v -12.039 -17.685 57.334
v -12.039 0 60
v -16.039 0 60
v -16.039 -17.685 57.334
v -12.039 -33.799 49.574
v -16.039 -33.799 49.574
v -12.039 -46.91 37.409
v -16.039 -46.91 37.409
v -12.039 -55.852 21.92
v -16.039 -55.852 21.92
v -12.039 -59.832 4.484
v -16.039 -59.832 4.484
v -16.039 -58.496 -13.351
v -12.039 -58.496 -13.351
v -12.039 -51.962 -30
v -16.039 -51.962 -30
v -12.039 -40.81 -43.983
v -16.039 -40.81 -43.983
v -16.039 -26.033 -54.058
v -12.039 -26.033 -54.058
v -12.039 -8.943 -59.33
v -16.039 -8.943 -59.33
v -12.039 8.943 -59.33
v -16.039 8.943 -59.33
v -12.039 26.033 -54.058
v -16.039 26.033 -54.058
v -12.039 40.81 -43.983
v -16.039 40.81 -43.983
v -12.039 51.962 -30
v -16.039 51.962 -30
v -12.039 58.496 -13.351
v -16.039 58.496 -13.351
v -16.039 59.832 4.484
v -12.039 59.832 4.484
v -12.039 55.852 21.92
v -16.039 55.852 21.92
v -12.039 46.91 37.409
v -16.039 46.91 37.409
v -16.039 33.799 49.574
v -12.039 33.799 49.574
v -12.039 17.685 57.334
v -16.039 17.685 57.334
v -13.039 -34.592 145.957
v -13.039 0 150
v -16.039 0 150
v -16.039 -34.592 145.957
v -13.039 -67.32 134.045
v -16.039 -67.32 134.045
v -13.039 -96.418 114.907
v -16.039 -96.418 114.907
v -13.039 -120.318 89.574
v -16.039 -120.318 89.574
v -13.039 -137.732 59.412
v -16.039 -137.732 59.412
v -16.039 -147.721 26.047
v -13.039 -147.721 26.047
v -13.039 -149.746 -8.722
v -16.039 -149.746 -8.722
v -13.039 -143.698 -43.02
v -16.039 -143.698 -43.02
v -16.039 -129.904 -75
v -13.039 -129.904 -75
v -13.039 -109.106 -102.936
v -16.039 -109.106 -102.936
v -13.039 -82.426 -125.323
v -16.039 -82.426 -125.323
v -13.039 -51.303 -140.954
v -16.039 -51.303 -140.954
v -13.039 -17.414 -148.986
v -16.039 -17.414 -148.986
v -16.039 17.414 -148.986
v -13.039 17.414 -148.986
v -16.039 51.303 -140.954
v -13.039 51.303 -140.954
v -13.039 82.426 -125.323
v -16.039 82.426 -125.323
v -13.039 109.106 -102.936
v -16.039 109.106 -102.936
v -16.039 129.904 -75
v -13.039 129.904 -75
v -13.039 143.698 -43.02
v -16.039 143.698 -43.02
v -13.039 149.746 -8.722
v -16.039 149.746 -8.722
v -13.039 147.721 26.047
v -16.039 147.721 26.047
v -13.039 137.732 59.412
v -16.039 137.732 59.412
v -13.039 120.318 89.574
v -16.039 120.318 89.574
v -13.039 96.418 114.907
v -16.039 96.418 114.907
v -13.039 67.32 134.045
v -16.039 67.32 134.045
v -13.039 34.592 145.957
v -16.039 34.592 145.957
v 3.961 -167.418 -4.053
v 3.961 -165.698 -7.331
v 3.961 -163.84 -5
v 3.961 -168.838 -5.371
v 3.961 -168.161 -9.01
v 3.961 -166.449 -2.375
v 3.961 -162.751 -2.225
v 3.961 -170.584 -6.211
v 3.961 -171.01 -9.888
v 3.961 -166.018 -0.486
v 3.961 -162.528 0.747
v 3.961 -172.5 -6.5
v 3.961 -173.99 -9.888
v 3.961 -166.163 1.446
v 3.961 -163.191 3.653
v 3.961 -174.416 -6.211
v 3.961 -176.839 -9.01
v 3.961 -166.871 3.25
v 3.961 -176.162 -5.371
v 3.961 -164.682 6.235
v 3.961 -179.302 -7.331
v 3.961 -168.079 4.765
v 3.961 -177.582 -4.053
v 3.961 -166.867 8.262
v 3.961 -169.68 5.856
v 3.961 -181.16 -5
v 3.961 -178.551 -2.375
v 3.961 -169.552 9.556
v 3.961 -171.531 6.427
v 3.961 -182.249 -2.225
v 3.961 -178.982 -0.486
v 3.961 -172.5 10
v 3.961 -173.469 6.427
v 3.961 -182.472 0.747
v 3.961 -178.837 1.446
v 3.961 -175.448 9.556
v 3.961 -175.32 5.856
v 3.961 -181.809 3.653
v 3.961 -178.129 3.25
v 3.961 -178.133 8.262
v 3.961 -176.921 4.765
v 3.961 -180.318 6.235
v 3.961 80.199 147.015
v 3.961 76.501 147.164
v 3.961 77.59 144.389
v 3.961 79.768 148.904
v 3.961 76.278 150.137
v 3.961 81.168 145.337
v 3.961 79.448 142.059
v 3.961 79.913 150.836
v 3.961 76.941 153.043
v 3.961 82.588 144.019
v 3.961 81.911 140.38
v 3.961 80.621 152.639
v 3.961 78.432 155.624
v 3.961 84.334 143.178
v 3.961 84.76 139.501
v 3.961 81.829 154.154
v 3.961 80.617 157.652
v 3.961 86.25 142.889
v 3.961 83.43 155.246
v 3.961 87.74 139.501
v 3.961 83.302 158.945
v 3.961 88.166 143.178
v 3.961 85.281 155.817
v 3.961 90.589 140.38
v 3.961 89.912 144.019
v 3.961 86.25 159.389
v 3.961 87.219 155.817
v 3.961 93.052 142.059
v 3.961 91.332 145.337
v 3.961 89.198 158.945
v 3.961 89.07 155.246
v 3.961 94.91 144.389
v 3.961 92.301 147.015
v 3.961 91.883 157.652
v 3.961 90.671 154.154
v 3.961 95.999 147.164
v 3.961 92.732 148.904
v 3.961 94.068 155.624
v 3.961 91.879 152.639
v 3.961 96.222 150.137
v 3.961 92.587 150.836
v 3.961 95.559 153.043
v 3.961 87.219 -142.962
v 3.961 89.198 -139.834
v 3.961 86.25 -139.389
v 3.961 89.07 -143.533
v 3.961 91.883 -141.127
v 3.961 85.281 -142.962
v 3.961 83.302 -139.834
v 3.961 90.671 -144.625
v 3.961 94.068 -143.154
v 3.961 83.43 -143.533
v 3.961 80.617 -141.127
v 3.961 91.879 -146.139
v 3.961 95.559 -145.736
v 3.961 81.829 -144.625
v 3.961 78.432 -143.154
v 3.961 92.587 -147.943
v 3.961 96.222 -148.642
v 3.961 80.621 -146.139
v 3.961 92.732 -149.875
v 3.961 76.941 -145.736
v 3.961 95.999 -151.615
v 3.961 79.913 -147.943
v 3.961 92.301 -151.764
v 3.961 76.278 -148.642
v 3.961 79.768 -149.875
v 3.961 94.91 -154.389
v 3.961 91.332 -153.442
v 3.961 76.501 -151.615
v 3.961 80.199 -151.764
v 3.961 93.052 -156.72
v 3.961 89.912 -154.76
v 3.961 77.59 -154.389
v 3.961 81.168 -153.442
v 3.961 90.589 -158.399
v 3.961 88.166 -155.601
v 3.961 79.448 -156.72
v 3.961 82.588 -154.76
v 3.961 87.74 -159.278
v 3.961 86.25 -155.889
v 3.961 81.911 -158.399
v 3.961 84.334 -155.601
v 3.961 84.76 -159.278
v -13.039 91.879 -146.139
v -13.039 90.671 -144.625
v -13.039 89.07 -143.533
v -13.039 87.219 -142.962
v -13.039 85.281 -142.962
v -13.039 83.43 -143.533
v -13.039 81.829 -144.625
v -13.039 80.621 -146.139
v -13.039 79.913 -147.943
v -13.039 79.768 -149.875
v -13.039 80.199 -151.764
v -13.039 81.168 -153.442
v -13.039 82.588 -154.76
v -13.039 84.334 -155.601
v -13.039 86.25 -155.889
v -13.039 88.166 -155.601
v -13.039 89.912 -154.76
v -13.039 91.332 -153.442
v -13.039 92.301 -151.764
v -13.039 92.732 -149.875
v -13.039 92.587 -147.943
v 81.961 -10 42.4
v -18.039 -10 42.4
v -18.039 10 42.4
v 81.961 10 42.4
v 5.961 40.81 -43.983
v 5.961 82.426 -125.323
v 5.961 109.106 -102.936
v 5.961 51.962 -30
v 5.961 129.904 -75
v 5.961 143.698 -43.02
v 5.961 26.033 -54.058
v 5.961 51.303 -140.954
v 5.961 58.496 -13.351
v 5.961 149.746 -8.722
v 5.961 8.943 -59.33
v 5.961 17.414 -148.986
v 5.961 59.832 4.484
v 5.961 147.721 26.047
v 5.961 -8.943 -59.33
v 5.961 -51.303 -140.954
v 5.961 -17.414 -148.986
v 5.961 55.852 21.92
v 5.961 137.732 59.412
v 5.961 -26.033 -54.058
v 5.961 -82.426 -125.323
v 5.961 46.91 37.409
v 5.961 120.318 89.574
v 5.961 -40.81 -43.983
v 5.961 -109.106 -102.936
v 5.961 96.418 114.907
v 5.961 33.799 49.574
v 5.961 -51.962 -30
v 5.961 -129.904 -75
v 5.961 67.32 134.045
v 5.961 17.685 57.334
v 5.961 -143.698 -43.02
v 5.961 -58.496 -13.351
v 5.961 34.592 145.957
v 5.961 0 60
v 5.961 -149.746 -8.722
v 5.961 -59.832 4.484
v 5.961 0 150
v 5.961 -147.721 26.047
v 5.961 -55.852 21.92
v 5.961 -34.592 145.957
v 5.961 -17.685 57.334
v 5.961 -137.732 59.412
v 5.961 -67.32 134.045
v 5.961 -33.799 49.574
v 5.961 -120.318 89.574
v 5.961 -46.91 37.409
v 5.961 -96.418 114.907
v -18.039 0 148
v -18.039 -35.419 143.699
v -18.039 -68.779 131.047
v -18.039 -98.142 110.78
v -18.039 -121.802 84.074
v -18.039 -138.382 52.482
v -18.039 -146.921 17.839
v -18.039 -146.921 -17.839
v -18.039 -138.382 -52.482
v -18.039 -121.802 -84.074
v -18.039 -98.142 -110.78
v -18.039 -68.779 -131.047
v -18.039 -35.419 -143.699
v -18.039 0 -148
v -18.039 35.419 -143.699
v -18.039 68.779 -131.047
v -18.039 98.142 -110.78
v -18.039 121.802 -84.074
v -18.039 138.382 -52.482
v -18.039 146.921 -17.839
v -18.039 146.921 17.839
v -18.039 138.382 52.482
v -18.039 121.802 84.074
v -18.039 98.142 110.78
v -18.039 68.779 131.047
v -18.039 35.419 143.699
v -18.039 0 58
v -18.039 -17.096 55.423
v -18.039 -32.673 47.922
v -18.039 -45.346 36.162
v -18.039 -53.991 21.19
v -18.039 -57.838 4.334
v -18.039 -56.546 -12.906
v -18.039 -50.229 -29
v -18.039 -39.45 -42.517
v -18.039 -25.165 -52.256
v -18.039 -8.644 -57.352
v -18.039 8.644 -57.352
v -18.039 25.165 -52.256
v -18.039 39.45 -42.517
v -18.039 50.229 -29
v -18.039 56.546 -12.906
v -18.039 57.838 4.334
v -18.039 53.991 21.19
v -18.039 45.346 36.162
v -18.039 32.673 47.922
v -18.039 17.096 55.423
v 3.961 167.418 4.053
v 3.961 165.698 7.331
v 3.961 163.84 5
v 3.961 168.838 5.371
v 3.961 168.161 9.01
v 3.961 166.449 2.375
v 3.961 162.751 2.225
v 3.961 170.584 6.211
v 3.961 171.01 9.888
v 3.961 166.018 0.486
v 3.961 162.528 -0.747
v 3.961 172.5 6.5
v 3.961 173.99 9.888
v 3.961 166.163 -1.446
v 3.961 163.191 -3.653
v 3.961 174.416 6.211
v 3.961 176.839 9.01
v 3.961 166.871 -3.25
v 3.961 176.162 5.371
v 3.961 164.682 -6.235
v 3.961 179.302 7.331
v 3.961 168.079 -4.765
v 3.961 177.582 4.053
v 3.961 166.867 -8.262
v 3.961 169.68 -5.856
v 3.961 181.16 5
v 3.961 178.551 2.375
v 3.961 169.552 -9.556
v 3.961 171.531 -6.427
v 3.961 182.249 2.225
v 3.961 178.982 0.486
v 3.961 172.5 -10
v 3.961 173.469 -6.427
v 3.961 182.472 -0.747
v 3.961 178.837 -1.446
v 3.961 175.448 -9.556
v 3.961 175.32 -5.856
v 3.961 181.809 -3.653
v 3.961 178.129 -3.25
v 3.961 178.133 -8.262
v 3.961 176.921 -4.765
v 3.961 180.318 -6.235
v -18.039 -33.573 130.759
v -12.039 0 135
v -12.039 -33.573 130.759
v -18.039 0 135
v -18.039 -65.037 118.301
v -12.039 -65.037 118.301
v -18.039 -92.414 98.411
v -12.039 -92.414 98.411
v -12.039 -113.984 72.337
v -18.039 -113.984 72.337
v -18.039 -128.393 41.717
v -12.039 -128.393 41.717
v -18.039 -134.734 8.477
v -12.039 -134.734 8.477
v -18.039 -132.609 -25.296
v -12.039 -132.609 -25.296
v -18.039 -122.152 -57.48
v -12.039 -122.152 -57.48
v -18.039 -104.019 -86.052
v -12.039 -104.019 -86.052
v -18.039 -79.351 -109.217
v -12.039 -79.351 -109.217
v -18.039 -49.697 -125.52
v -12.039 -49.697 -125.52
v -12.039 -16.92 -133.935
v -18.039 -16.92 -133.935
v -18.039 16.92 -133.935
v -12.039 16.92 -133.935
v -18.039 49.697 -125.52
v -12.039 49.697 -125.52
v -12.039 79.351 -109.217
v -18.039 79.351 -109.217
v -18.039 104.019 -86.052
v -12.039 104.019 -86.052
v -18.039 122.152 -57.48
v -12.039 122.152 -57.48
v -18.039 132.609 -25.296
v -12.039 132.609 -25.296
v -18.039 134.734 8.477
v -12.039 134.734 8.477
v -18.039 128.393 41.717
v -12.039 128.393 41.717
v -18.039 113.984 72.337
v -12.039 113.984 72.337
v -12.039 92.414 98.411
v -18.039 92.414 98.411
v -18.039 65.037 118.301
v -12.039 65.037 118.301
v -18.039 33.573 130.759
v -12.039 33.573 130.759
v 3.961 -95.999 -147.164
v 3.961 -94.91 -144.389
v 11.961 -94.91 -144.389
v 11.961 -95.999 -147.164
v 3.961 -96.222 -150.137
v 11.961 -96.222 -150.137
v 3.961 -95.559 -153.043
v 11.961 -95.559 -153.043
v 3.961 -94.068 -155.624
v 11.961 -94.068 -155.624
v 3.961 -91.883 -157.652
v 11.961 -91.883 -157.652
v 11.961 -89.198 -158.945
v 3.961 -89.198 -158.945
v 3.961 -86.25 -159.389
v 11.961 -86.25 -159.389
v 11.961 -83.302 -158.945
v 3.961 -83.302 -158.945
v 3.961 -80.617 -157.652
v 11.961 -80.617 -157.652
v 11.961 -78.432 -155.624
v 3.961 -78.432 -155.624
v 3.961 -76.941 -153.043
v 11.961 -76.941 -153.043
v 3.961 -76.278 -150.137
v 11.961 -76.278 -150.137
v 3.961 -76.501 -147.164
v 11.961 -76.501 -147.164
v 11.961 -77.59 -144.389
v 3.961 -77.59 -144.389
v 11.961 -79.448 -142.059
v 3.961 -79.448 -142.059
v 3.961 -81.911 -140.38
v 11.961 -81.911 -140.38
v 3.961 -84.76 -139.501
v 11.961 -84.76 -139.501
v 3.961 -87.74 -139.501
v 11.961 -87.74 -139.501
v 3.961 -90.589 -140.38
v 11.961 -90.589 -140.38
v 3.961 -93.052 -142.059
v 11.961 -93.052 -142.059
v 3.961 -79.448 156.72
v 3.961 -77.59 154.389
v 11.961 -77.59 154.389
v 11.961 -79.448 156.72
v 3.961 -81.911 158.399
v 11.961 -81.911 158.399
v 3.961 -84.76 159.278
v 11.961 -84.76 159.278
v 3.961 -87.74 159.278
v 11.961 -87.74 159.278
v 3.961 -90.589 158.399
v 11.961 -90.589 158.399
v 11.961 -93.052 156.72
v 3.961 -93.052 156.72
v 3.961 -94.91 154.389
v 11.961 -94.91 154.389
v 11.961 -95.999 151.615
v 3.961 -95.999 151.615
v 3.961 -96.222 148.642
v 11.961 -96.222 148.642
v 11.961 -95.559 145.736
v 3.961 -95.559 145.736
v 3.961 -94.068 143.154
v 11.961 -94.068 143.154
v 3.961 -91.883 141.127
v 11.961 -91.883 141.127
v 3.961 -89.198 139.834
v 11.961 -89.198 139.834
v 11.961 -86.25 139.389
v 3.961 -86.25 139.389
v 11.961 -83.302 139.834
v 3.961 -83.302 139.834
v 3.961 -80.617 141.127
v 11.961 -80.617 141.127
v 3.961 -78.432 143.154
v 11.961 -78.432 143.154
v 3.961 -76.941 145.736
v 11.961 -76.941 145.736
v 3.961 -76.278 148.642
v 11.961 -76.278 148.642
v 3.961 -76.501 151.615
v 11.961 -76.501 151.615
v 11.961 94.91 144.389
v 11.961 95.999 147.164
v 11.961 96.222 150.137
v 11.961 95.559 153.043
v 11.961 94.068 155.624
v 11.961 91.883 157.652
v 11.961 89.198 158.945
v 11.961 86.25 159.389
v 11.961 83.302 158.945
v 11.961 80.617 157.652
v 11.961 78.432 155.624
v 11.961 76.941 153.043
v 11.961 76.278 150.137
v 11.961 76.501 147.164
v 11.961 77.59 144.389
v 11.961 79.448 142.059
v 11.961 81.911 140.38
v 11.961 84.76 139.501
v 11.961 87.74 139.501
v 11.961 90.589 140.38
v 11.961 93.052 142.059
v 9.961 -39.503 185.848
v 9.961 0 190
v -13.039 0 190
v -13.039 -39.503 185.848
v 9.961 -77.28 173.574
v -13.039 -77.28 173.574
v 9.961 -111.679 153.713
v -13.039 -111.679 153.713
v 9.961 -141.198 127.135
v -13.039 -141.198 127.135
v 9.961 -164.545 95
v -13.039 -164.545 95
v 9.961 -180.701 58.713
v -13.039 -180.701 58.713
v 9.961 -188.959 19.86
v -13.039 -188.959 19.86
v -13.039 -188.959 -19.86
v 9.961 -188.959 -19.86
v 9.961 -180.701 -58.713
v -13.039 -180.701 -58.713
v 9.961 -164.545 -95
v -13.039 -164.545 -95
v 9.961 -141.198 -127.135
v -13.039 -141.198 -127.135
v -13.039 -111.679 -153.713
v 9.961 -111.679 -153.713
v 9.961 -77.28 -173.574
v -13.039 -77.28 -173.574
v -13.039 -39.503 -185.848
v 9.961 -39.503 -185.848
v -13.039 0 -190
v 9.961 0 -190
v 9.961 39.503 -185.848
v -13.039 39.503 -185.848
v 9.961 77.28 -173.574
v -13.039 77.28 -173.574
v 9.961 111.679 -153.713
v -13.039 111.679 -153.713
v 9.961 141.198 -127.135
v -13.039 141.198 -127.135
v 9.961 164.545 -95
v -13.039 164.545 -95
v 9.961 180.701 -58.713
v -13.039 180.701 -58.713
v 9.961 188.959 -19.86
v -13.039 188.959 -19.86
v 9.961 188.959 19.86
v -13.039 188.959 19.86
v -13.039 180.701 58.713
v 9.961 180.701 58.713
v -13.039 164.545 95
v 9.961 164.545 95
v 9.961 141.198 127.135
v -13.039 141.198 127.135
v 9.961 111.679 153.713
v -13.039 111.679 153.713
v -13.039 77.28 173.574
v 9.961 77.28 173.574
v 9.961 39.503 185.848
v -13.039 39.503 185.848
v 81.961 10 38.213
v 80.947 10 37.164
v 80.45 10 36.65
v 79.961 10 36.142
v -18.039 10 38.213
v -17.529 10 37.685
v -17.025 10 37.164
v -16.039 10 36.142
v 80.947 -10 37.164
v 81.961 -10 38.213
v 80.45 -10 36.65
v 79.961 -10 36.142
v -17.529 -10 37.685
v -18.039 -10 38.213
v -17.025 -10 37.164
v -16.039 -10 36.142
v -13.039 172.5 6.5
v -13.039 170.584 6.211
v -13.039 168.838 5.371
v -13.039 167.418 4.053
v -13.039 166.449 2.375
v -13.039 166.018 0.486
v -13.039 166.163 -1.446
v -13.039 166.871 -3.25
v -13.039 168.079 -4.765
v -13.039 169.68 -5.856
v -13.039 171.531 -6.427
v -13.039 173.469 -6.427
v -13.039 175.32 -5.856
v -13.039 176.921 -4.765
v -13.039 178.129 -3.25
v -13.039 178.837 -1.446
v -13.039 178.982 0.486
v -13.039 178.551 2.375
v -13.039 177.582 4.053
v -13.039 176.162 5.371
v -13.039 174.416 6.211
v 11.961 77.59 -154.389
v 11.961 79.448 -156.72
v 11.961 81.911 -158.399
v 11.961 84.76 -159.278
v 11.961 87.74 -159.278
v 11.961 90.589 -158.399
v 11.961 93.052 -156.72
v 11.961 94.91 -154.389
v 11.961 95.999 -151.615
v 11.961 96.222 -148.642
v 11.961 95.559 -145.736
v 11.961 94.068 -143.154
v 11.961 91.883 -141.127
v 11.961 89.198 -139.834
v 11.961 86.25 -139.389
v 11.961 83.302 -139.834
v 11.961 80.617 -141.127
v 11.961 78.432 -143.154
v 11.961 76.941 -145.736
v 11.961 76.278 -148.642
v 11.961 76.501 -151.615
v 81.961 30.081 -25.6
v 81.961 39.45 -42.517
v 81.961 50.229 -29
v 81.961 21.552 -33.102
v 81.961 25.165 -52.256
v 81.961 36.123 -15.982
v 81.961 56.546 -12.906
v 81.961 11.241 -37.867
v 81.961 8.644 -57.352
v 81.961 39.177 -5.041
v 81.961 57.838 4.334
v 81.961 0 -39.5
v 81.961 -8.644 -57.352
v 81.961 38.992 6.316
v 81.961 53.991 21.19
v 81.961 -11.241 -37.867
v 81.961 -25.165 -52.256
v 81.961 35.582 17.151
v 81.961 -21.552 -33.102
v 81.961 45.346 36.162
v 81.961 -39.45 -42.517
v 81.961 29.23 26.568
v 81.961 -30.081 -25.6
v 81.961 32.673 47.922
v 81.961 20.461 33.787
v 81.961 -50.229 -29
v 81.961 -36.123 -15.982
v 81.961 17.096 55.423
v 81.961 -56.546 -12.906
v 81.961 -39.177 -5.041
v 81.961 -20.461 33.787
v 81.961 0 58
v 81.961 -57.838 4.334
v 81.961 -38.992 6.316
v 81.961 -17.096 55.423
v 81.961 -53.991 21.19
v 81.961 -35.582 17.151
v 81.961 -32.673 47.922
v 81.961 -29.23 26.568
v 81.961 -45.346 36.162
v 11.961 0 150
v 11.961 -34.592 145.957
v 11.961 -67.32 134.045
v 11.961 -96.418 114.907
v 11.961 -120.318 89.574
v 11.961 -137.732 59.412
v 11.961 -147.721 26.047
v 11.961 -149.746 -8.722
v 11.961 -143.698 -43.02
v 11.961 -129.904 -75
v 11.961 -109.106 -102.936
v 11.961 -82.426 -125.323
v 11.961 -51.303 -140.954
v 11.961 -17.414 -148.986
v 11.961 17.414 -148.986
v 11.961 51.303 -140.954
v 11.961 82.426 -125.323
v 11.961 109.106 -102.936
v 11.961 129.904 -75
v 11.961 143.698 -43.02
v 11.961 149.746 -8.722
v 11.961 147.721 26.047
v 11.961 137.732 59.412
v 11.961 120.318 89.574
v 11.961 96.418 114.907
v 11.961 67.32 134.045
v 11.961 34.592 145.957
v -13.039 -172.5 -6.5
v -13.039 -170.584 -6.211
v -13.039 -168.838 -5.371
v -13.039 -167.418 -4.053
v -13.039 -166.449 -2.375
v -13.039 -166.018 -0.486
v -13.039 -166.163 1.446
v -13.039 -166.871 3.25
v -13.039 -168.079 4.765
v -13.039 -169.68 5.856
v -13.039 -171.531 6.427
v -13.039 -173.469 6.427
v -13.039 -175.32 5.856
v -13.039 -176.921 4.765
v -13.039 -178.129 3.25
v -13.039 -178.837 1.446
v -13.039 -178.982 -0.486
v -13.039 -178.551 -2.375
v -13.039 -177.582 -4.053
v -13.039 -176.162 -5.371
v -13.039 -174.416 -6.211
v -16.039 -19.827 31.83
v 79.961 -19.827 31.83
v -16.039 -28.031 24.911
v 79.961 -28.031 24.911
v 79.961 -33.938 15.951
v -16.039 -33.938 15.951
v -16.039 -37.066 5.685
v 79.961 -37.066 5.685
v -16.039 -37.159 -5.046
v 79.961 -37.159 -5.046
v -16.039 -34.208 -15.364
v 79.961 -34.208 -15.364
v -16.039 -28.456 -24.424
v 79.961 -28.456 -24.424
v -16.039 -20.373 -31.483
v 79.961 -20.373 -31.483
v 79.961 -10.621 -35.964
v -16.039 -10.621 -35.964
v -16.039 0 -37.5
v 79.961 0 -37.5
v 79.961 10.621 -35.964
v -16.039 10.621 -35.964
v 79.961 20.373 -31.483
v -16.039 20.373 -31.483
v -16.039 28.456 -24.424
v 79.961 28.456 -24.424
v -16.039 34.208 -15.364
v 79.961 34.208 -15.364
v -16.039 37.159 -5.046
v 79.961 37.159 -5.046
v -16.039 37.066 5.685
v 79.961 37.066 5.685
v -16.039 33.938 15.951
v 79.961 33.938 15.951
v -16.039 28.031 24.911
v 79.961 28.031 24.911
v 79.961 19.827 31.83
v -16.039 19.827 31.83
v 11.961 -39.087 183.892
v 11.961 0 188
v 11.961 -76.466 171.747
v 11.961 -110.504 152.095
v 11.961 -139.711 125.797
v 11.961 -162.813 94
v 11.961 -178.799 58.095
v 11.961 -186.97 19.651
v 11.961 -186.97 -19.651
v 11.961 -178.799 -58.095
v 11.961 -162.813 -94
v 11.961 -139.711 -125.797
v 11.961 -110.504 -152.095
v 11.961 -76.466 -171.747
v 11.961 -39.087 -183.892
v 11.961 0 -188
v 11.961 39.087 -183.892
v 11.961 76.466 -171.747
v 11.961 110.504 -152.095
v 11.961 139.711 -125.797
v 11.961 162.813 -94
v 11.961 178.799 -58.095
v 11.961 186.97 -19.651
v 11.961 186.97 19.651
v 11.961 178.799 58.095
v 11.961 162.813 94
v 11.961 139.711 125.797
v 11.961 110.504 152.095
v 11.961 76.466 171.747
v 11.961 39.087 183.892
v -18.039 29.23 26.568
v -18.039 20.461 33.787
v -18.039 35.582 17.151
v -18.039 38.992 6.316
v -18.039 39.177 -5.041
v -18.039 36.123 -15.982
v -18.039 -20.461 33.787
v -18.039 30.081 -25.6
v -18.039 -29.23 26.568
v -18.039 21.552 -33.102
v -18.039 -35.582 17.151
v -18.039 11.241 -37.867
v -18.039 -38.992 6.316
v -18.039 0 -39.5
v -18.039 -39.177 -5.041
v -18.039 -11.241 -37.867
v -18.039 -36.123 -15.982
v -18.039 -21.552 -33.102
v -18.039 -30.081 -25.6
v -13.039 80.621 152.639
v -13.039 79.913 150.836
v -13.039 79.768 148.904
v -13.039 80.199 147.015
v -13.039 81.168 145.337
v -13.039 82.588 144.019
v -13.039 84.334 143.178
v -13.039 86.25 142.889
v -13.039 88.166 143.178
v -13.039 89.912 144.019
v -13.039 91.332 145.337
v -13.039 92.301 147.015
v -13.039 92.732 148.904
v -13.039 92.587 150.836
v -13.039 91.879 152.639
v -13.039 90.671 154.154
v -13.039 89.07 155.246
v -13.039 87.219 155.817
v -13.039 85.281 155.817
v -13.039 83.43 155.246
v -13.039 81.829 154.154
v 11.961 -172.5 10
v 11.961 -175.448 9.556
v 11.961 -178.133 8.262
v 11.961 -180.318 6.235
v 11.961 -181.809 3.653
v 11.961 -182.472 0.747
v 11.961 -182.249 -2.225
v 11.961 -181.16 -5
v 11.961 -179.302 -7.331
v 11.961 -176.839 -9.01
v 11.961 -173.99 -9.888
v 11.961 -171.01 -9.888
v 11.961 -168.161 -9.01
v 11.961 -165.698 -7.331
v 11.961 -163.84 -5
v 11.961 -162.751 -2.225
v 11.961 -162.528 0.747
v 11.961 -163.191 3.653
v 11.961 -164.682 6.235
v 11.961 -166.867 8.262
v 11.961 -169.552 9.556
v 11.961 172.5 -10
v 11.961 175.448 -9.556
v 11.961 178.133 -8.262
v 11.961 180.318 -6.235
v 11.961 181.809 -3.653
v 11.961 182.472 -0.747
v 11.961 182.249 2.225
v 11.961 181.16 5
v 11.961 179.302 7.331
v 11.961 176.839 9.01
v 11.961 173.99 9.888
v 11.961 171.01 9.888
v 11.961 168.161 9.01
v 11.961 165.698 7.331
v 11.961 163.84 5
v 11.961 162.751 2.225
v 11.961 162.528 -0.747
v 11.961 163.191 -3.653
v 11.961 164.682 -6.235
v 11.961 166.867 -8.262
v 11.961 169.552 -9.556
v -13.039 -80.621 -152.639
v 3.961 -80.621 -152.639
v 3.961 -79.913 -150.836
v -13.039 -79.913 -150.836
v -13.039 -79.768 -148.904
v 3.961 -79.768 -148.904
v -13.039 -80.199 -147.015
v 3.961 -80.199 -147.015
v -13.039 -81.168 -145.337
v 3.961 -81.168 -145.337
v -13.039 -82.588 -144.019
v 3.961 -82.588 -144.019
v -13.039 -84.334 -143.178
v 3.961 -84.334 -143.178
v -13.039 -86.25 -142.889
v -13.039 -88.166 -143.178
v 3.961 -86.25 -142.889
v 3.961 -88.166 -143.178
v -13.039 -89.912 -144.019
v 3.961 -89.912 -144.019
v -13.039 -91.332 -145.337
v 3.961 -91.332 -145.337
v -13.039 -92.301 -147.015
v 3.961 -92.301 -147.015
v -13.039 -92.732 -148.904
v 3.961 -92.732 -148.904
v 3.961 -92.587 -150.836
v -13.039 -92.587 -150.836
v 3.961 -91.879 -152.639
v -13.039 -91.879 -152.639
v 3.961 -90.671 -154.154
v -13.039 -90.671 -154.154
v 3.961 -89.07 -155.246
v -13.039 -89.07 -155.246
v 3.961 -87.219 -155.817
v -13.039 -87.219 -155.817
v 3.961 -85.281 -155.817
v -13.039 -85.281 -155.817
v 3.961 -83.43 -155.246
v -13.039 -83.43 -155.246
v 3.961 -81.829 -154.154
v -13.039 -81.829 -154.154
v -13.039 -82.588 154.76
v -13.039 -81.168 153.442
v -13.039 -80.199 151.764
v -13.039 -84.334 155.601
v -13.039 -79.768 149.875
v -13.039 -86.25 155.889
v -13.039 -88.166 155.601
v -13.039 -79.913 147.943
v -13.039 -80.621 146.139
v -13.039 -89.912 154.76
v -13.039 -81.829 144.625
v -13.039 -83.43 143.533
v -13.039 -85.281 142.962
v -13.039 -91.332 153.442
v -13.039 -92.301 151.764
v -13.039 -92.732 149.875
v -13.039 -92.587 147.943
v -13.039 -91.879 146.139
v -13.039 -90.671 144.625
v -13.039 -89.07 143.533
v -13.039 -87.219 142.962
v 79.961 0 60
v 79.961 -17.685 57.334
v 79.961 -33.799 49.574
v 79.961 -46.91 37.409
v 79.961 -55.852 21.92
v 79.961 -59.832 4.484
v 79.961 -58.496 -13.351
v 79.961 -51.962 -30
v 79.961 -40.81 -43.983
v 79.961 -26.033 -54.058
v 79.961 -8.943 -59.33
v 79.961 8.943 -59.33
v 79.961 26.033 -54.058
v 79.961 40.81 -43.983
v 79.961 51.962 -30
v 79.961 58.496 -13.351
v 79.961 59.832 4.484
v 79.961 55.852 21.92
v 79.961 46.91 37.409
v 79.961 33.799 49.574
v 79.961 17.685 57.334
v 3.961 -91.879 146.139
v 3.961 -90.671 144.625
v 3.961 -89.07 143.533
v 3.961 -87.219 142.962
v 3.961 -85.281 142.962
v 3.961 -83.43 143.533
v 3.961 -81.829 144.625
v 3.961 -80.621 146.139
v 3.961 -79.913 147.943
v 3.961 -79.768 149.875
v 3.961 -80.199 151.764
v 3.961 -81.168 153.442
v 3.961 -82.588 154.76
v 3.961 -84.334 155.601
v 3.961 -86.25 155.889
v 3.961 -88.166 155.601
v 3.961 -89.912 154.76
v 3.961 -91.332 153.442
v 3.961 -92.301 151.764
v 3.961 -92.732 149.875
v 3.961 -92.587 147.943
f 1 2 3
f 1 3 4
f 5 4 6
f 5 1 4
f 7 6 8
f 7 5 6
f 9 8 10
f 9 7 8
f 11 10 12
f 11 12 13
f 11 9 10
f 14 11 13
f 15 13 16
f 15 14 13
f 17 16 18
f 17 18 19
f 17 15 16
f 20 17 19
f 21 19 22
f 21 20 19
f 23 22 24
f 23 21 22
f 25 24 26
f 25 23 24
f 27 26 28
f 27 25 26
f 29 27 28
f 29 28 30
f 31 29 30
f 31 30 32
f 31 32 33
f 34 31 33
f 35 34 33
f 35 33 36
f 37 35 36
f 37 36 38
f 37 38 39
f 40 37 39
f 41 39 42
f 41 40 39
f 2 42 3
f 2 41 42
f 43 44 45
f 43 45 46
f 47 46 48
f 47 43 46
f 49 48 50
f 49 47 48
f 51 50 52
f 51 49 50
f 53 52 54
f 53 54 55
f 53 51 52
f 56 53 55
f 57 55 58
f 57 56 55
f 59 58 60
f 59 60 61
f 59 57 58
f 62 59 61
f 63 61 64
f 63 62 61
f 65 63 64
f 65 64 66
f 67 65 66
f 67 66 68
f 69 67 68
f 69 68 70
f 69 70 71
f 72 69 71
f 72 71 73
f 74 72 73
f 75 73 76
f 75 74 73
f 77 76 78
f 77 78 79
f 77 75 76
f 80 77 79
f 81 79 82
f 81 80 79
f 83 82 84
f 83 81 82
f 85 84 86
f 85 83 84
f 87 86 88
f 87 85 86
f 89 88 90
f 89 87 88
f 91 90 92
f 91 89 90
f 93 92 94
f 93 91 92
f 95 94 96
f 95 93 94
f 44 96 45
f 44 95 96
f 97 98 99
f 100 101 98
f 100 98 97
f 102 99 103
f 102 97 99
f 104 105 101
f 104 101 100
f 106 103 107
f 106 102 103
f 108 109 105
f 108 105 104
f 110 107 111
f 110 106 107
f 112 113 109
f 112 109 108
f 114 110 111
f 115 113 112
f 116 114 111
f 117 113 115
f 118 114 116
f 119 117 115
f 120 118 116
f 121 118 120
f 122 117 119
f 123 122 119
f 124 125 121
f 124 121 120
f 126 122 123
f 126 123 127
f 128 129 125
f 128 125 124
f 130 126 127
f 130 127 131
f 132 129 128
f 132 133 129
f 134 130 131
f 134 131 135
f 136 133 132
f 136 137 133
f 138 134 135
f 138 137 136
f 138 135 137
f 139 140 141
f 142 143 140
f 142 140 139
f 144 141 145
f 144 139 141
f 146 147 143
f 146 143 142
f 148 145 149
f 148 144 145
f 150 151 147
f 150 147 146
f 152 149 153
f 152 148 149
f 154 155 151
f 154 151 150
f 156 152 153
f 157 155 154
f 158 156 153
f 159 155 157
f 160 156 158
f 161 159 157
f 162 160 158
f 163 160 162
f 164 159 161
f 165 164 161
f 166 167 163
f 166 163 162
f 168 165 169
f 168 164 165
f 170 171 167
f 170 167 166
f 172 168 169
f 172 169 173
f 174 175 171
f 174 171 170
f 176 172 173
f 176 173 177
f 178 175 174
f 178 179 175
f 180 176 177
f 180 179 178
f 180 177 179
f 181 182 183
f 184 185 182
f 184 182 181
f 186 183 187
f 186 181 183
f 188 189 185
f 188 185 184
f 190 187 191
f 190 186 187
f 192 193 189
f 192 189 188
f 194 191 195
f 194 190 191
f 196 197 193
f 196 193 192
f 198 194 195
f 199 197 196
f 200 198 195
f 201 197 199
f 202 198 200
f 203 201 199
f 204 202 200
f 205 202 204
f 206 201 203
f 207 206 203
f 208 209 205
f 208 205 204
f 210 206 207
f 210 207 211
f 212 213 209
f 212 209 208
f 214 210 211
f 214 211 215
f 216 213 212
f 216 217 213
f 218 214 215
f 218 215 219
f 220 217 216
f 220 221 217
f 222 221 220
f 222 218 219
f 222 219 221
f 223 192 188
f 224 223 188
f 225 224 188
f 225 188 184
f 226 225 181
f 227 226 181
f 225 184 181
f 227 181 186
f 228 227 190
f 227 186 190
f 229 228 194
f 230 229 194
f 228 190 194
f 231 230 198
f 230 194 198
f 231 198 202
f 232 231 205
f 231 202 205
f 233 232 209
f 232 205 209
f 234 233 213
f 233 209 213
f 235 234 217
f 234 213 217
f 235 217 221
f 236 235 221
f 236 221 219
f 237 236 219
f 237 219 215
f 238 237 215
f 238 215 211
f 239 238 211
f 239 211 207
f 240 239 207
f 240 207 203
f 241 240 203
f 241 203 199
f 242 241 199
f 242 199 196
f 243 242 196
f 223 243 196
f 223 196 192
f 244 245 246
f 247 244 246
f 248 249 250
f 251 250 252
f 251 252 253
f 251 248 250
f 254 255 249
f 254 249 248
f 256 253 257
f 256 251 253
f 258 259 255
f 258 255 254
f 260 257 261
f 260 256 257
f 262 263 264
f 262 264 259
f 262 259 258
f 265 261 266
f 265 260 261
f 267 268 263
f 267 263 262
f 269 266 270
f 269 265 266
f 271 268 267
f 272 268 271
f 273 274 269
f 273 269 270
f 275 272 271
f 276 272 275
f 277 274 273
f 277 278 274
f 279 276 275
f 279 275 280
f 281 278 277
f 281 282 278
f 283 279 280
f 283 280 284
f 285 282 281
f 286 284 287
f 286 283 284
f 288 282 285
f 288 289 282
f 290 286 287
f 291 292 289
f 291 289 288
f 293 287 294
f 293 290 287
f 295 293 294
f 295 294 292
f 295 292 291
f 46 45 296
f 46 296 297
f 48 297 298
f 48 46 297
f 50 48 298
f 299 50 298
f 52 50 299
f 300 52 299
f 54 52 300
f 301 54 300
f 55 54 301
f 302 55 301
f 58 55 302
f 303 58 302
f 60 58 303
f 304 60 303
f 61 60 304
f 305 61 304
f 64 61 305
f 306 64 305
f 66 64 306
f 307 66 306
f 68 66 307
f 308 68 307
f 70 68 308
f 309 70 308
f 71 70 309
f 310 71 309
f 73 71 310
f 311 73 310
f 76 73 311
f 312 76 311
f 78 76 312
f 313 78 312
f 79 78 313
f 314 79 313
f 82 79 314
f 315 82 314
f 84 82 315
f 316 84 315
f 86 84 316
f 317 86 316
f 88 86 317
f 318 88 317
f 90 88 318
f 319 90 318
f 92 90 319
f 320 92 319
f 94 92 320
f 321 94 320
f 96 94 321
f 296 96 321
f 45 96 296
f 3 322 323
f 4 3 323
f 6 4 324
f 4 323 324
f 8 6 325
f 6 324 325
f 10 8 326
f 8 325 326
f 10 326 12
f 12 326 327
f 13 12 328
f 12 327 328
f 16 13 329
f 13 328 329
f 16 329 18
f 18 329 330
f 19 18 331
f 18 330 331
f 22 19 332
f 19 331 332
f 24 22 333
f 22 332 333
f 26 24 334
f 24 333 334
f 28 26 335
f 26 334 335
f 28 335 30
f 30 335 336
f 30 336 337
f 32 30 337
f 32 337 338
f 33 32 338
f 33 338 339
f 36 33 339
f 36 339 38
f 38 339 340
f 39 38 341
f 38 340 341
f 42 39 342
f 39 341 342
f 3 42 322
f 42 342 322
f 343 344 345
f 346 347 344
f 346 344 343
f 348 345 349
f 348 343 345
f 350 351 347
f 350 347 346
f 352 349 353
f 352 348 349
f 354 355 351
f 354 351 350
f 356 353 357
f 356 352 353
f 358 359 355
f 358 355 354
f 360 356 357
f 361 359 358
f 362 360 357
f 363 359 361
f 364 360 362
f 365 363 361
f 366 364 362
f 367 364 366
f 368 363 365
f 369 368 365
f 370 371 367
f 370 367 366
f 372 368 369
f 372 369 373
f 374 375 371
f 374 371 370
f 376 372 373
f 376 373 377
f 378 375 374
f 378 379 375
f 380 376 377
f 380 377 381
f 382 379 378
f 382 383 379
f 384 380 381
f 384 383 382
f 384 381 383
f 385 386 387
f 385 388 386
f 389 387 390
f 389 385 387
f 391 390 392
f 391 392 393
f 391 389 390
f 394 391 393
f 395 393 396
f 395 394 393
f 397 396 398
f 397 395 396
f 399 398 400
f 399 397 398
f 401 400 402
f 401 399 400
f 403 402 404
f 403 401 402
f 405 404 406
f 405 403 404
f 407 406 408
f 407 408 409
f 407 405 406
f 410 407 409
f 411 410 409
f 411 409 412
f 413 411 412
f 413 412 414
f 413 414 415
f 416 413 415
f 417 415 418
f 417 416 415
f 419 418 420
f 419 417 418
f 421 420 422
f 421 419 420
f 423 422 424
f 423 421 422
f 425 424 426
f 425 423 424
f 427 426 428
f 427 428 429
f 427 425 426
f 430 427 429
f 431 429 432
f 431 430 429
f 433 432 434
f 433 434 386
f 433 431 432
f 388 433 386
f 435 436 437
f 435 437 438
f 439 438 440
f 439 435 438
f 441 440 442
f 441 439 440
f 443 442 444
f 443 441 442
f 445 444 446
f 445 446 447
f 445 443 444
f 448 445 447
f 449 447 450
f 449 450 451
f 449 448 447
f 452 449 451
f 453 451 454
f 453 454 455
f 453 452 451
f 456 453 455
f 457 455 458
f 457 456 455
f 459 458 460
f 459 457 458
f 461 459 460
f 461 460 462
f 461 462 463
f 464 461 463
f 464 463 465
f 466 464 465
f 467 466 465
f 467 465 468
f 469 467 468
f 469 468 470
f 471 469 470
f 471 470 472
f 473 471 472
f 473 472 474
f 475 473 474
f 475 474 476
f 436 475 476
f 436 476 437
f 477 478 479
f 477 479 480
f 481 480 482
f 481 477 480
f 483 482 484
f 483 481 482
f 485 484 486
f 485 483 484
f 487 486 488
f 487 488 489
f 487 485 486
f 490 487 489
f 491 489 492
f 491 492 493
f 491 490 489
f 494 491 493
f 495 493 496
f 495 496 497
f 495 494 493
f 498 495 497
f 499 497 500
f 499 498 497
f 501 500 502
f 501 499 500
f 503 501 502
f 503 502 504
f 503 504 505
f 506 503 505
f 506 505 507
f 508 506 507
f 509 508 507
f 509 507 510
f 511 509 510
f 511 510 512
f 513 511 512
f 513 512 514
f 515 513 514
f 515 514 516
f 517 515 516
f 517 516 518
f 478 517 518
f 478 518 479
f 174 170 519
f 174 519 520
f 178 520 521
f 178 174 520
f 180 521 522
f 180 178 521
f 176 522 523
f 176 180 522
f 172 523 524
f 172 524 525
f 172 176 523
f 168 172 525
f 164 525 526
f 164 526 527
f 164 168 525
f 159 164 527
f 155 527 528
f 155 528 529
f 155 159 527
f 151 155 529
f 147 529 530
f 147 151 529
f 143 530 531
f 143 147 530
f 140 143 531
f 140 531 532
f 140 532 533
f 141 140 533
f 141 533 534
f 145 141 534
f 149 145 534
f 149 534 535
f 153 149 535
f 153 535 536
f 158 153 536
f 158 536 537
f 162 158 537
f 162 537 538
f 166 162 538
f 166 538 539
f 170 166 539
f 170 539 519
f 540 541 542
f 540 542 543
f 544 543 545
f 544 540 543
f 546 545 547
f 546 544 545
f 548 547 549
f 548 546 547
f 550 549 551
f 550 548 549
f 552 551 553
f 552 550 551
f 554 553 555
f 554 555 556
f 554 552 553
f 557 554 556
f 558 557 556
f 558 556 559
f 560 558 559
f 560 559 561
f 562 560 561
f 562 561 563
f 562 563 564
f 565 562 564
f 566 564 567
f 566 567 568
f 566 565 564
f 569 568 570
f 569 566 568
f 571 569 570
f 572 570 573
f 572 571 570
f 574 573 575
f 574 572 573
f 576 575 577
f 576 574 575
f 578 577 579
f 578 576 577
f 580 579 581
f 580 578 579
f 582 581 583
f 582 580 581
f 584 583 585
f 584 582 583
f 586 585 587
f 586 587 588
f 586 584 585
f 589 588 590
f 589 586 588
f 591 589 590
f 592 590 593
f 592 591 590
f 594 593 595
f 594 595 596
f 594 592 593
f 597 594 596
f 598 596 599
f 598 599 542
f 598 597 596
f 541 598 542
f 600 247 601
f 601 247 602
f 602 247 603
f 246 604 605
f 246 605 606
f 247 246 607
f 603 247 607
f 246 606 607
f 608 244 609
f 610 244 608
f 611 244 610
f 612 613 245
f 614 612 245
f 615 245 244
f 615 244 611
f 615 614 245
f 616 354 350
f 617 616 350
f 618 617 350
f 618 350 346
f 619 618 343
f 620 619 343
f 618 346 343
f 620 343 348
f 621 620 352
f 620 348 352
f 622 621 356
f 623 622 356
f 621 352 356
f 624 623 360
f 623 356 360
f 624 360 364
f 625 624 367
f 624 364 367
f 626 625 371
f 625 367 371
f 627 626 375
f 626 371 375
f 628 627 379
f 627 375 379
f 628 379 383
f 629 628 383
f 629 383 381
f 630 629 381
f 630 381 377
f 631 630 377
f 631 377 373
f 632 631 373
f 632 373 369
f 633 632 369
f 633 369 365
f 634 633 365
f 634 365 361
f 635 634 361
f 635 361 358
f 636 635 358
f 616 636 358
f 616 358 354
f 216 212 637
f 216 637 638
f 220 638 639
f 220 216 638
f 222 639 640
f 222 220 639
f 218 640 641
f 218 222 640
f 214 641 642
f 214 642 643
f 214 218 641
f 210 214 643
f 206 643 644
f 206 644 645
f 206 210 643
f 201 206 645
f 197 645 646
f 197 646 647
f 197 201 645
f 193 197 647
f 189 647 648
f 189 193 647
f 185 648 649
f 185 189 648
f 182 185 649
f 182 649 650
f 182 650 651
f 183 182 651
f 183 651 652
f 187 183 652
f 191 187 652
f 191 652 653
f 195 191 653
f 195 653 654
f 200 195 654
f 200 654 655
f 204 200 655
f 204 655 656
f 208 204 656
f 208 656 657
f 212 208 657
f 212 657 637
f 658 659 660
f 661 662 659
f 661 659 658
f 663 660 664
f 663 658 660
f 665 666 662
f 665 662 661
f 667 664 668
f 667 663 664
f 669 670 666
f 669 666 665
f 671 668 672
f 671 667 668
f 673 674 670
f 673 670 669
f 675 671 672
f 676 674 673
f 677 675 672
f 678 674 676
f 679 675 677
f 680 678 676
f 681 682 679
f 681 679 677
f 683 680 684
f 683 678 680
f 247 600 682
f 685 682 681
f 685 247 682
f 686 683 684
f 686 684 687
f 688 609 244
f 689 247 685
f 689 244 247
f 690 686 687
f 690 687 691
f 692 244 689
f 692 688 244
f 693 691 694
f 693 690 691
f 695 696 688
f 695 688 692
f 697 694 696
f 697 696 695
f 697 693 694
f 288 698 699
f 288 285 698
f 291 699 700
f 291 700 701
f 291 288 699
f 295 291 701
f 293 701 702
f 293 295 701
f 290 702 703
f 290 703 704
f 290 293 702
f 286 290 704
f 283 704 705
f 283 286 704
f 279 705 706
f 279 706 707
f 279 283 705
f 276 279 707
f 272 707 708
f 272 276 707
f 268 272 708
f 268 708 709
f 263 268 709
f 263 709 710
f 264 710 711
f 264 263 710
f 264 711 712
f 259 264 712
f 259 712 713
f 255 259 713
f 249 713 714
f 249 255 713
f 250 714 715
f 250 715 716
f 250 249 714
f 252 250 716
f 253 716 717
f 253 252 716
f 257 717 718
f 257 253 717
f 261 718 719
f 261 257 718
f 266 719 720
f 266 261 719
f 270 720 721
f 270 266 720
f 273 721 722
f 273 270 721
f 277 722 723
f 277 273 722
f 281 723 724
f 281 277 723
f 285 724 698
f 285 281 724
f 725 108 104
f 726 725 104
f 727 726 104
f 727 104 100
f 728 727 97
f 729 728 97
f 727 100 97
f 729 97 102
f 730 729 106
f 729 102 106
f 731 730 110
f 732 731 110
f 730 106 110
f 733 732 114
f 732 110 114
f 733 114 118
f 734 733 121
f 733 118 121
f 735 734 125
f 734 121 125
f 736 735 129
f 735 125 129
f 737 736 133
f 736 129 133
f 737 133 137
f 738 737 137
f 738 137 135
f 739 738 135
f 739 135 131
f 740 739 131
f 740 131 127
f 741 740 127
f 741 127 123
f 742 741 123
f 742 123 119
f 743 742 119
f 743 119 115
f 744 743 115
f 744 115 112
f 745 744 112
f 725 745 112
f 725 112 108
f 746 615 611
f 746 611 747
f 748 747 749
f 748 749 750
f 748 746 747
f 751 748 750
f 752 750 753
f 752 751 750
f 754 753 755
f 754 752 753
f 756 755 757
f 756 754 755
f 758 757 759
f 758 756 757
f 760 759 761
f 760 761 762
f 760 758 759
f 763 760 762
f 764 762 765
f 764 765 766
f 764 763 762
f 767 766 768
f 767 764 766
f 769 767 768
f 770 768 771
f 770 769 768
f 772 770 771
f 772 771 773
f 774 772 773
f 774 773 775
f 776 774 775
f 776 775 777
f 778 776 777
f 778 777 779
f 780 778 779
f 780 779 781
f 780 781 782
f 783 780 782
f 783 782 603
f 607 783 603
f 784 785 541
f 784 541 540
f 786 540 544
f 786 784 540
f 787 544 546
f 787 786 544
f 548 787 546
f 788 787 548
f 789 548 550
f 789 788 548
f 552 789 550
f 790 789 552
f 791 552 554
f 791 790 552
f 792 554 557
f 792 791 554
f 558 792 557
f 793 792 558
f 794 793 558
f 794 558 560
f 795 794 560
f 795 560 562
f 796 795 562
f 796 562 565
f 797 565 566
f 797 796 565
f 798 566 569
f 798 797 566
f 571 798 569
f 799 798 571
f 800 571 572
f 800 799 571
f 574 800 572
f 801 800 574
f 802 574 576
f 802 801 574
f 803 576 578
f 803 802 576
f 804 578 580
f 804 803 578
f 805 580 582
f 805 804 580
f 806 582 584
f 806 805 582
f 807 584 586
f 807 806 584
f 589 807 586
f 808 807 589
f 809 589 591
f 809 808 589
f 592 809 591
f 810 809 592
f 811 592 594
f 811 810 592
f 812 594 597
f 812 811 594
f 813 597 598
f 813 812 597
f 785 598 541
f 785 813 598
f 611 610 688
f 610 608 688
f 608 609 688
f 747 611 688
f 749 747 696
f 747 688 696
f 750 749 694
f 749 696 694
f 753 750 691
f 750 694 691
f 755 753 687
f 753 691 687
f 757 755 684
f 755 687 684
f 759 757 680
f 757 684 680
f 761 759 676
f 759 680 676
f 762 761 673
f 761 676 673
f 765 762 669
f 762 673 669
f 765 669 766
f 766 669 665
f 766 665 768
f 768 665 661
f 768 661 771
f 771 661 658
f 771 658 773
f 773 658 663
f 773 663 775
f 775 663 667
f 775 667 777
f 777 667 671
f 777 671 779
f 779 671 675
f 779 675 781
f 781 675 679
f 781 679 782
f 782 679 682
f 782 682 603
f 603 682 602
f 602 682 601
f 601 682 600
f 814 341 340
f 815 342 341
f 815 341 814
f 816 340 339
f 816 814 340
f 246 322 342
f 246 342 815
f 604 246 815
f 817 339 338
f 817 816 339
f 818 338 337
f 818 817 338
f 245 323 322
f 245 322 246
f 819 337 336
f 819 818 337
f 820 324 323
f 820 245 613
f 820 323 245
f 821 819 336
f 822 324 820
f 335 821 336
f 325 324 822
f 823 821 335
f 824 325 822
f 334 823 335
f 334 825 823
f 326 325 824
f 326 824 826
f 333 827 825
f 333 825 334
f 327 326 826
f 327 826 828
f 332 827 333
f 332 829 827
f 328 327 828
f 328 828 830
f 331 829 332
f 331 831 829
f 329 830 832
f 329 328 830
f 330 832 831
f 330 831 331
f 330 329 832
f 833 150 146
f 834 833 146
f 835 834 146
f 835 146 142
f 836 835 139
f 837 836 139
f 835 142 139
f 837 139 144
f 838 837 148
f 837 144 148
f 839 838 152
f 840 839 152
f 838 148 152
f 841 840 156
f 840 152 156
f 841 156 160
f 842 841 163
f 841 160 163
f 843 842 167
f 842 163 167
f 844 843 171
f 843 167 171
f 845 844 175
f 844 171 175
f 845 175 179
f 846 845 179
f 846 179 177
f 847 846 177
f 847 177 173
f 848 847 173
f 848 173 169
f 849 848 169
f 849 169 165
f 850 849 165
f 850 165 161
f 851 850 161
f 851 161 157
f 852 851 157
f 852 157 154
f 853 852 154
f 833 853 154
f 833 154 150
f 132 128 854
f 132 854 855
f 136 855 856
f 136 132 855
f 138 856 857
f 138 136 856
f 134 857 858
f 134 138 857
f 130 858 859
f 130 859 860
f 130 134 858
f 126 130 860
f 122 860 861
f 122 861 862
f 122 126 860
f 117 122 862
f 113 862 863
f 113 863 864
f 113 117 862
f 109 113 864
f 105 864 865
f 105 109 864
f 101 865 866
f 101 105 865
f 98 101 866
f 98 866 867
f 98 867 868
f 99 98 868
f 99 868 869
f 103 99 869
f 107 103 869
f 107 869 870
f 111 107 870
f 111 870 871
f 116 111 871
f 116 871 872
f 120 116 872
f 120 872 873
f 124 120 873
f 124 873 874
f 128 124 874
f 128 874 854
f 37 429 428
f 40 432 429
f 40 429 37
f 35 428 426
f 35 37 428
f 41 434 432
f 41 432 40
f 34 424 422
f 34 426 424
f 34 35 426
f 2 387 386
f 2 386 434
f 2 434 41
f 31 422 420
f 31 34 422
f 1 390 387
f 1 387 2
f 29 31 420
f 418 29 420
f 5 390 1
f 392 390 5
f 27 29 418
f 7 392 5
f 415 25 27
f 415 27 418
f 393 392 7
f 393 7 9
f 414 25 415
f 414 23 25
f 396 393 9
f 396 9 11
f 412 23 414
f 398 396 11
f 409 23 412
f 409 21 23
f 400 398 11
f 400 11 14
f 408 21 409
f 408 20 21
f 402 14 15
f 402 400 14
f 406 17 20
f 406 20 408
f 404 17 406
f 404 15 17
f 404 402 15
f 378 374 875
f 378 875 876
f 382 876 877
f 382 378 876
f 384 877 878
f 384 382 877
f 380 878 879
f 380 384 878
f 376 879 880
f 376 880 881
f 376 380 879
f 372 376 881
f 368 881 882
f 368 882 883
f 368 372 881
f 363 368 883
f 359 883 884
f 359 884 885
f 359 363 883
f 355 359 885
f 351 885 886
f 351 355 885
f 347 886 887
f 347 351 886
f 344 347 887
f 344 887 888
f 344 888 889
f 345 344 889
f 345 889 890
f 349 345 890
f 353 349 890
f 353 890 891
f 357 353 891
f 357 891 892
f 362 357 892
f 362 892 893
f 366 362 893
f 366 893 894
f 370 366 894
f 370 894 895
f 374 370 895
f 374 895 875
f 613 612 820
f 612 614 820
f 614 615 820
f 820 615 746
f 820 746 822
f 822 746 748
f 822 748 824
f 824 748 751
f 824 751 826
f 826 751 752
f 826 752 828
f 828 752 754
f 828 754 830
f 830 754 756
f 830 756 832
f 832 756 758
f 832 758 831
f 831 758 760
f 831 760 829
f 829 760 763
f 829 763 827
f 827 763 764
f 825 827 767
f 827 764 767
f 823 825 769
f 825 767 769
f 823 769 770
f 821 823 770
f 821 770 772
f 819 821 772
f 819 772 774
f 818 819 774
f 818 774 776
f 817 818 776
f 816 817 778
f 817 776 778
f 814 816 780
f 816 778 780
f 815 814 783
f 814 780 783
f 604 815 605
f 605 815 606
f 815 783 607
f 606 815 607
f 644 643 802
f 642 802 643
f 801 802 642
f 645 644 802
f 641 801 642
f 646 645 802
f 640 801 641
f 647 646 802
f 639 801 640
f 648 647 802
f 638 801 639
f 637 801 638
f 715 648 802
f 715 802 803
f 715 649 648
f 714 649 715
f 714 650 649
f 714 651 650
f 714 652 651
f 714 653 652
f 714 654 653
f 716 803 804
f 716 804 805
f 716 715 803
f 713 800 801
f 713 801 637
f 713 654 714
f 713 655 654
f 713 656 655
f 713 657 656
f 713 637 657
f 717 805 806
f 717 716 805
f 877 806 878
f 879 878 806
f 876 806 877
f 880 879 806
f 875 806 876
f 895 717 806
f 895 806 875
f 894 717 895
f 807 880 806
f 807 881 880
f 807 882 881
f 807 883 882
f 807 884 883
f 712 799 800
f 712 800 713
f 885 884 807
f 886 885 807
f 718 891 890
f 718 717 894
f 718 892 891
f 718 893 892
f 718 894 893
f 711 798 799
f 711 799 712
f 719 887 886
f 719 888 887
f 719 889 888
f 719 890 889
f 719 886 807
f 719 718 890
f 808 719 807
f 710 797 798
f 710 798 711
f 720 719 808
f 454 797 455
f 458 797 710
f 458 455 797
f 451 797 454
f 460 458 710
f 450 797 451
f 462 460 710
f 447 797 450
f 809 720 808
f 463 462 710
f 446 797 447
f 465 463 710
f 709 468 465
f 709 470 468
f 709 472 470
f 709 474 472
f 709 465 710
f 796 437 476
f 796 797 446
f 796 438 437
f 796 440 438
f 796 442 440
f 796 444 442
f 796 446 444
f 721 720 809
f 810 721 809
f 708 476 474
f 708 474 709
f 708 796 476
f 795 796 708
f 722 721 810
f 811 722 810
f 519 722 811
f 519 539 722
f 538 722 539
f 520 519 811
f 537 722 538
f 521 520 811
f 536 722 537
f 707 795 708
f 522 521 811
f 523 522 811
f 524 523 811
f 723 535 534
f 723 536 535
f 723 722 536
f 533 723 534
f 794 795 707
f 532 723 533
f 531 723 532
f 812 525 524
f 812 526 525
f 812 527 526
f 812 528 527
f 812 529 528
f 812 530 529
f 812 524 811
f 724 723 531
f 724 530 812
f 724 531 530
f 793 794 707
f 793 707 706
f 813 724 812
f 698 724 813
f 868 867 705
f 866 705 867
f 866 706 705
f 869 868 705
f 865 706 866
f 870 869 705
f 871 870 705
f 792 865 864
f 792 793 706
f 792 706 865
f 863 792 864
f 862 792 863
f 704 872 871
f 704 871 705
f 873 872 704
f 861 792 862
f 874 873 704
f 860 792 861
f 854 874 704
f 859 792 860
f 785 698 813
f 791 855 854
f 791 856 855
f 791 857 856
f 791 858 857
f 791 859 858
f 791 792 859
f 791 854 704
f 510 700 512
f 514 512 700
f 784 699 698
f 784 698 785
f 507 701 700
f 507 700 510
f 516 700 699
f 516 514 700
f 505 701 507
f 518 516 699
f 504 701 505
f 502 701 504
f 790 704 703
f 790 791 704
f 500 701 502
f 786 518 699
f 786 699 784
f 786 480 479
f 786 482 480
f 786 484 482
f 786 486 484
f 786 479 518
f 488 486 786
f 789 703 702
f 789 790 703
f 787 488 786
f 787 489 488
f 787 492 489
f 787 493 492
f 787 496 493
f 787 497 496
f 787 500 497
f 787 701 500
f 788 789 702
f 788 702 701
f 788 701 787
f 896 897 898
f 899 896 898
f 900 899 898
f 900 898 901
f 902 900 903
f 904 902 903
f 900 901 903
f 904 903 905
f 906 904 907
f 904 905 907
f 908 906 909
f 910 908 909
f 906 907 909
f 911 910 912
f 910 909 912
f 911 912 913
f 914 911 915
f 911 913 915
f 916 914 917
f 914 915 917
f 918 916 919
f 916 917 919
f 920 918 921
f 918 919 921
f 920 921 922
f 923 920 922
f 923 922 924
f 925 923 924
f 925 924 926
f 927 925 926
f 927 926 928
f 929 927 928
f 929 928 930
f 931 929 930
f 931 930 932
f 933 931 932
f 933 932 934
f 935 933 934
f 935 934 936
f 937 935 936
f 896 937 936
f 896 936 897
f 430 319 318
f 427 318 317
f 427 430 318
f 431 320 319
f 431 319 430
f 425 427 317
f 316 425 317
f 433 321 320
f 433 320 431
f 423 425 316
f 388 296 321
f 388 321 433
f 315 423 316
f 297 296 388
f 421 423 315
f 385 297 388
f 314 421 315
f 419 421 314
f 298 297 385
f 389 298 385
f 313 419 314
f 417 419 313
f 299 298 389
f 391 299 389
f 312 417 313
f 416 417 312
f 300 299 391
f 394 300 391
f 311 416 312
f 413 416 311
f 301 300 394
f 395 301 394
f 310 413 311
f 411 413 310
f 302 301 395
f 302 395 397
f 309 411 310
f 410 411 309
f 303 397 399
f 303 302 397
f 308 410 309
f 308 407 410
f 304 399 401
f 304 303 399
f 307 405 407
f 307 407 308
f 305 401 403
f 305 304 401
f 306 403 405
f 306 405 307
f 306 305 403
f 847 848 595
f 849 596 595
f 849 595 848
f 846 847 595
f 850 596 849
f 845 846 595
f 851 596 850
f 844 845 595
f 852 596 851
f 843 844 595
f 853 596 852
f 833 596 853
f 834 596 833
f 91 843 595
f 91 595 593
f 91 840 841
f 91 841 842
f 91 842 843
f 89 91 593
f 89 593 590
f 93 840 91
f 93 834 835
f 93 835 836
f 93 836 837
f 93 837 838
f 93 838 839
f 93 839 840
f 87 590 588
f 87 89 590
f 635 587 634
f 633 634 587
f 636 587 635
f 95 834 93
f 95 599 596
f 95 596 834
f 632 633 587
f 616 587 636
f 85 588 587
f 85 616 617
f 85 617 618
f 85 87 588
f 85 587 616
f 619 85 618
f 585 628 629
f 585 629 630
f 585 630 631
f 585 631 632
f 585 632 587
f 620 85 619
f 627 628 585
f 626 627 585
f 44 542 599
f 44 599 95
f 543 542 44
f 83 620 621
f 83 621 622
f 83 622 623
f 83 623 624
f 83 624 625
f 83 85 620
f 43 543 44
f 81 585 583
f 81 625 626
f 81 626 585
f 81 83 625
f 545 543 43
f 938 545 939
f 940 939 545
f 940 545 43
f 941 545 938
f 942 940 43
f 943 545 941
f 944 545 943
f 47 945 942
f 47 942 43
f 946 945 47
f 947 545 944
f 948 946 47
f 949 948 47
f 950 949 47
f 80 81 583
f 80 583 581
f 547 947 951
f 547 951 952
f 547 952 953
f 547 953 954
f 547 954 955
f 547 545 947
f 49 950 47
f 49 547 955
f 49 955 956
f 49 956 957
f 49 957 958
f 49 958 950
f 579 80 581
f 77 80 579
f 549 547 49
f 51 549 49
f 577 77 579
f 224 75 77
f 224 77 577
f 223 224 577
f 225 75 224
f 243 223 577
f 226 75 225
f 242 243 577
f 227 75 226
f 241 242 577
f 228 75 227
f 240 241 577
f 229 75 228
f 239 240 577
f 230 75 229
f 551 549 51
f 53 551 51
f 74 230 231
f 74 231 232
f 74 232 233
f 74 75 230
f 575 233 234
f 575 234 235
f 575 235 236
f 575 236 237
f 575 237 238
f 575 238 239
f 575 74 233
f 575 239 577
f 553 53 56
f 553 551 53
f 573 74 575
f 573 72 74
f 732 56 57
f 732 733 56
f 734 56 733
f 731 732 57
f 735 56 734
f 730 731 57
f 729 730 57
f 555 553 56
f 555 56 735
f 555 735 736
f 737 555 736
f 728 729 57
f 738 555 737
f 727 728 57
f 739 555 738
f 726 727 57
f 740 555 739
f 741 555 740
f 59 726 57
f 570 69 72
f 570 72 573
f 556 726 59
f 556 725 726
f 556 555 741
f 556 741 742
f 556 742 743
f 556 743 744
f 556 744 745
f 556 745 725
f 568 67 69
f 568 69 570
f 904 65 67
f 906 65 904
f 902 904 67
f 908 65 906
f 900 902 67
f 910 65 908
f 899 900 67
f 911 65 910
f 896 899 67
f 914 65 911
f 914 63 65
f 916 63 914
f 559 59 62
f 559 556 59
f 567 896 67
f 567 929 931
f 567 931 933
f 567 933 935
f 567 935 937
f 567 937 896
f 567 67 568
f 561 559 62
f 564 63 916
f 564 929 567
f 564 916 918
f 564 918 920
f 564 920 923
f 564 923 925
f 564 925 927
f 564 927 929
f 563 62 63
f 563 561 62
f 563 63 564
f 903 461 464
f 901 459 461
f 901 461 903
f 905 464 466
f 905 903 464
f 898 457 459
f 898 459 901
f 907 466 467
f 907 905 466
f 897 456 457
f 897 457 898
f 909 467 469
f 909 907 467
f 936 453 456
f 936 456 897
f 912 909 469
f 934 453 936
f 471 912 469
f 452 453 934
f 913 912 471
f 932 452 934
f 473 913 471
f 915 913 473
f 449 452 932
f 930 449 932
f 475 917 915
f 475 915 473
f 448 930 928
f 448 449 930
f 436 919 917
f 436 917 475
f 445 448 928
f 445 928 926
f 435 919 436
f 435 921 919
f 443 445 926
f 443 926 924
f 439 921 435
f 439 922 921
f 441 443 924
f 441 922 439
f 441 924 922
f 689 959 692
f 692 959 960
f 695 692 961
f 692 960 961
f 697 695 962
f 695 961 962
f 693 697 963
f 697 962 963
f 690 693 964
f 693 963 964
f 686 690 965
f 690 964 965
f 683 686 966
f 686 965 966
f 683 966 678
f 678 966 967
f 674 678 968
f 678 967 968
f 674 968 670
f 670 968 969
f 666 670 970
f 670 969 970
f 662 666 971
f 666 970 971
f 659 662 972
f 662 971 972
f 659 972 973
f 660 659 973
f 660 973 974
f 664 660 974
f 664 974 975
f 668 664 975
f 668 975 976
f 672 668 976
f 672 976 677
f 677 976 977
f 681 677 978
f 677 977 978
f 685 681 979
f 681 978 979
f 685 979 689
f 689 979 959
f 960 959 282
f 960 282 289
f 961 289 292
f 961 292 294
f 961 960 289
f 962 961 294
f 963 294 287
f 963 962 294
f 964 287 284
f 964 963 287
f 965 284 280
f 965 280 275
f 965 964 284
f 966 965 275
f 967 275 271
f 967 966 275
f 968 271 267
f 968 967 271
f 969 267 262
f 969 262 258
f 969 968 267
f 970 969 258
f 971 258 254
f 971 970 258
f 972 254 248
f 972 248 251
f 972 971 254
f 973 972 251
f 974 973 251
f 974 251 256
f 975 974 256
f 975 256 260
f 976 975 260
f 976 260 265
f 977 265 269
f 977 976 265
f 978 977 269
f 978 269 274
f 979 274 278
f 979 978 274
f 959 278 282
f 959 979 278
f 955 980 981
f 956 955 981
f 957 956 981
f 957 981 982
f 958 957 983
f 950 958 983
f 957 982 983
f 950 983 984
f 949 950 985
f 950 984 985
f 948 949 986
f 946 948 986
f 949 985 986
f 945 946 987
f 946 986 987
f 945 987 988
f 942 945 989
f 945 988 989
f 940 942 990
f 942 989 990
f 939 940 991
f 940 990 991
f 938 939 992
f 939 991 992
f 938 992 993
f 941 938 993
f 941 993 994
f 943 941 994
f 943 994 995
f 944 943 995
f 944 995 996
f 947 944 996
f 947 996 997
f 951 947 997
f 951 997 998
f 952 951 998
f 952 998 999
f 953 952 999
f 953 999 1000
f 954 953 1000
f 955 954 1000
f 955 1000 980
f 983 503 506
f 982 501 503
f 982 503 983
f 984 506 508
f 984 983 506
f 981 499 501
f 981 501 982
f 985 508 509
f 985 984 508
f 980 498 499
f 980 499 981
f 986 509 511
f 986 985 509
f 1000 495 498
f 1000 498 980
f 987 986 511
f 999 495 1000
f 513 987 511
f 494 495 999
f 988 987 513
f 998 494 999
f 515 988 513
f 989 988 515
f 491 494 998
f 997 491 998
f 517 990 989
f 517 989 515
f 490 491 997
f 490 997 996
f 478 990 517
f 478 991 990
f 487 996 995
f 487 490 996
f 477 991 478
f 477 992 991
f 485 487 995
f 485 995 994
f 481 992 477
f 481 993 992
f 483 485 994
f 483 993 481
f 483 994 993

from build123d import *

# Parameters (mm, degrees)
CUT_EXTRUDE_1_DEPTH      = 281.922693463
CUT_EXTRUDE_1_DEPTH_BACK = 281.922693463
SKETCH_3_W               = 42.4
SKETCH_3_H               = 20
CUT_EXTRUDE_START        = 3.96072
SKETCH_4_R               = 10
CUT_EXTRUDE_2_DEPTH      = 8.000001
SKETCH_5_R               = 6.5
CUT_EXTRUDE_3_DEPTH      = 280.792780464
PATTERN_CIRCULAR_1_COUNT = 6
CHAMFER_1_SIZE           = 2


with BuildPart() as part:
    # Эскиз1 → Повернуть1 (revolve)
    with BuildSketch(Plane.XY, mode=Mode.PRIVATE) as revolve_1_sk:
        Polygon((-18.039279514, 135), (-18.039279514, 150), (-13.039279514, 150), (-13.039279514, 190), (11.960720486, 190), (11.960720486, 150), (5.960720486, 150), (5.960720486, 60), (81.960720486, 60), (81.960720486, 37.5), (-18.039279514, 37.5), (-18.039279514, 60), (-12.039279514, 60), (-12.039279514, 135), align=None)
    revolve(revolve_1_sk.sketch.rotate(Axis((-127.420307677, 0, 0), (1, 0, 0)), 90), axis=Axis((-127.420307677, 0, 0), (1, 0, 0)))

    # Эскиз3 → Вырез-Вытянуть1 (cut, two sides: drawn at the far end of the back side and taken through both)
    with BuildSketch(Plane(origin=(0, 0, 0), x_dir=(0, 0, -1), z_dir=(1, 0, 0)).offset(-CUT_EXTRUDE_1_DEPTH_BACK)):
        with Locations((-21.2, 0)):
            Rectangle(SKETCH_3_W, SKETCH_3_H)
    extrude(amount=CUT_EXTRUDE_1_DEPTH + CUT_EXTRUDE_1_DEPTH_BACK, mode=Mode.SUBTRACT)

    # Эскиз4 → Вырез-Вытянуть2 (cut)
    with BuildSketch(Plane(origin=(0, 0, 0), x_dir=(0, 0, -1), z_dir=(1, 0, 0)).offset(CUT_EXTRUDE_START)):
        with Locations(Location((0, -172.5, 0), (0, 0, 180))):
            Circle(SKETCH_4_R)
    cut_extrude_2 = extrude(amount=CUT_EXTRUDE_2_DEPTH, mode=Mode.SUBTRACT)

    # Эскиз5 → Вырез-Вытянуть3 (cut, through all)
    with BuildSketch(Plane(origin=(3.960720486, 0, 0), x_dir=(0, 0, -1), z_dir=(1, 0, 0))):
        with Locations((0, -172.5)):
            Circle(SKETCH_5_R)
    cut_extrude_3 = extrude(amount=-CUT_EXTRUDE_3_DEPTH, mode=Mode.SUBTRACT)

    # Круговой массив1: Вырез-Вытянуть2, Вырез-Вытянуть3 ×6 about axis
    pattern_circular_1_axis = Axis((0, 0, 0), (1, 0, 0))
    add([cut_extrude_2.rotate(pattern_circular_1_axis, i * 360 / PATTERN_CIRCULAR_1_COUNT) for i in range(1, PATTERN_CIRCULAR_1_COUNT)], mode=Mode.SUBTRACT)
    add([cut_extrude_3.rotate(pattern_circular_1_axis, i * 360 / PATTERN_CIRCULAR_1_COUNT) for i in range(1, PATTERN_CIRCULAR_1_COUNT)], mode=Mode.SUBTRACT)

    # Фаска1
    chamfer_1_edges = [part.edges().sort_by_distance(p)[0] for p in [
        (11.960720486, 0, -190),
        (81.960720486, 0, -60),
        (81.960720486, 0, -37.5),
        (-18.039279514, 0, -37.5),
        (-18.039279514, 0, -60),
        (-18.039279514, 0, -150),
    ]]
    chamfer(chamfer_1_edges, length=CHAMFER_1_SIZE)


solid = part.part
